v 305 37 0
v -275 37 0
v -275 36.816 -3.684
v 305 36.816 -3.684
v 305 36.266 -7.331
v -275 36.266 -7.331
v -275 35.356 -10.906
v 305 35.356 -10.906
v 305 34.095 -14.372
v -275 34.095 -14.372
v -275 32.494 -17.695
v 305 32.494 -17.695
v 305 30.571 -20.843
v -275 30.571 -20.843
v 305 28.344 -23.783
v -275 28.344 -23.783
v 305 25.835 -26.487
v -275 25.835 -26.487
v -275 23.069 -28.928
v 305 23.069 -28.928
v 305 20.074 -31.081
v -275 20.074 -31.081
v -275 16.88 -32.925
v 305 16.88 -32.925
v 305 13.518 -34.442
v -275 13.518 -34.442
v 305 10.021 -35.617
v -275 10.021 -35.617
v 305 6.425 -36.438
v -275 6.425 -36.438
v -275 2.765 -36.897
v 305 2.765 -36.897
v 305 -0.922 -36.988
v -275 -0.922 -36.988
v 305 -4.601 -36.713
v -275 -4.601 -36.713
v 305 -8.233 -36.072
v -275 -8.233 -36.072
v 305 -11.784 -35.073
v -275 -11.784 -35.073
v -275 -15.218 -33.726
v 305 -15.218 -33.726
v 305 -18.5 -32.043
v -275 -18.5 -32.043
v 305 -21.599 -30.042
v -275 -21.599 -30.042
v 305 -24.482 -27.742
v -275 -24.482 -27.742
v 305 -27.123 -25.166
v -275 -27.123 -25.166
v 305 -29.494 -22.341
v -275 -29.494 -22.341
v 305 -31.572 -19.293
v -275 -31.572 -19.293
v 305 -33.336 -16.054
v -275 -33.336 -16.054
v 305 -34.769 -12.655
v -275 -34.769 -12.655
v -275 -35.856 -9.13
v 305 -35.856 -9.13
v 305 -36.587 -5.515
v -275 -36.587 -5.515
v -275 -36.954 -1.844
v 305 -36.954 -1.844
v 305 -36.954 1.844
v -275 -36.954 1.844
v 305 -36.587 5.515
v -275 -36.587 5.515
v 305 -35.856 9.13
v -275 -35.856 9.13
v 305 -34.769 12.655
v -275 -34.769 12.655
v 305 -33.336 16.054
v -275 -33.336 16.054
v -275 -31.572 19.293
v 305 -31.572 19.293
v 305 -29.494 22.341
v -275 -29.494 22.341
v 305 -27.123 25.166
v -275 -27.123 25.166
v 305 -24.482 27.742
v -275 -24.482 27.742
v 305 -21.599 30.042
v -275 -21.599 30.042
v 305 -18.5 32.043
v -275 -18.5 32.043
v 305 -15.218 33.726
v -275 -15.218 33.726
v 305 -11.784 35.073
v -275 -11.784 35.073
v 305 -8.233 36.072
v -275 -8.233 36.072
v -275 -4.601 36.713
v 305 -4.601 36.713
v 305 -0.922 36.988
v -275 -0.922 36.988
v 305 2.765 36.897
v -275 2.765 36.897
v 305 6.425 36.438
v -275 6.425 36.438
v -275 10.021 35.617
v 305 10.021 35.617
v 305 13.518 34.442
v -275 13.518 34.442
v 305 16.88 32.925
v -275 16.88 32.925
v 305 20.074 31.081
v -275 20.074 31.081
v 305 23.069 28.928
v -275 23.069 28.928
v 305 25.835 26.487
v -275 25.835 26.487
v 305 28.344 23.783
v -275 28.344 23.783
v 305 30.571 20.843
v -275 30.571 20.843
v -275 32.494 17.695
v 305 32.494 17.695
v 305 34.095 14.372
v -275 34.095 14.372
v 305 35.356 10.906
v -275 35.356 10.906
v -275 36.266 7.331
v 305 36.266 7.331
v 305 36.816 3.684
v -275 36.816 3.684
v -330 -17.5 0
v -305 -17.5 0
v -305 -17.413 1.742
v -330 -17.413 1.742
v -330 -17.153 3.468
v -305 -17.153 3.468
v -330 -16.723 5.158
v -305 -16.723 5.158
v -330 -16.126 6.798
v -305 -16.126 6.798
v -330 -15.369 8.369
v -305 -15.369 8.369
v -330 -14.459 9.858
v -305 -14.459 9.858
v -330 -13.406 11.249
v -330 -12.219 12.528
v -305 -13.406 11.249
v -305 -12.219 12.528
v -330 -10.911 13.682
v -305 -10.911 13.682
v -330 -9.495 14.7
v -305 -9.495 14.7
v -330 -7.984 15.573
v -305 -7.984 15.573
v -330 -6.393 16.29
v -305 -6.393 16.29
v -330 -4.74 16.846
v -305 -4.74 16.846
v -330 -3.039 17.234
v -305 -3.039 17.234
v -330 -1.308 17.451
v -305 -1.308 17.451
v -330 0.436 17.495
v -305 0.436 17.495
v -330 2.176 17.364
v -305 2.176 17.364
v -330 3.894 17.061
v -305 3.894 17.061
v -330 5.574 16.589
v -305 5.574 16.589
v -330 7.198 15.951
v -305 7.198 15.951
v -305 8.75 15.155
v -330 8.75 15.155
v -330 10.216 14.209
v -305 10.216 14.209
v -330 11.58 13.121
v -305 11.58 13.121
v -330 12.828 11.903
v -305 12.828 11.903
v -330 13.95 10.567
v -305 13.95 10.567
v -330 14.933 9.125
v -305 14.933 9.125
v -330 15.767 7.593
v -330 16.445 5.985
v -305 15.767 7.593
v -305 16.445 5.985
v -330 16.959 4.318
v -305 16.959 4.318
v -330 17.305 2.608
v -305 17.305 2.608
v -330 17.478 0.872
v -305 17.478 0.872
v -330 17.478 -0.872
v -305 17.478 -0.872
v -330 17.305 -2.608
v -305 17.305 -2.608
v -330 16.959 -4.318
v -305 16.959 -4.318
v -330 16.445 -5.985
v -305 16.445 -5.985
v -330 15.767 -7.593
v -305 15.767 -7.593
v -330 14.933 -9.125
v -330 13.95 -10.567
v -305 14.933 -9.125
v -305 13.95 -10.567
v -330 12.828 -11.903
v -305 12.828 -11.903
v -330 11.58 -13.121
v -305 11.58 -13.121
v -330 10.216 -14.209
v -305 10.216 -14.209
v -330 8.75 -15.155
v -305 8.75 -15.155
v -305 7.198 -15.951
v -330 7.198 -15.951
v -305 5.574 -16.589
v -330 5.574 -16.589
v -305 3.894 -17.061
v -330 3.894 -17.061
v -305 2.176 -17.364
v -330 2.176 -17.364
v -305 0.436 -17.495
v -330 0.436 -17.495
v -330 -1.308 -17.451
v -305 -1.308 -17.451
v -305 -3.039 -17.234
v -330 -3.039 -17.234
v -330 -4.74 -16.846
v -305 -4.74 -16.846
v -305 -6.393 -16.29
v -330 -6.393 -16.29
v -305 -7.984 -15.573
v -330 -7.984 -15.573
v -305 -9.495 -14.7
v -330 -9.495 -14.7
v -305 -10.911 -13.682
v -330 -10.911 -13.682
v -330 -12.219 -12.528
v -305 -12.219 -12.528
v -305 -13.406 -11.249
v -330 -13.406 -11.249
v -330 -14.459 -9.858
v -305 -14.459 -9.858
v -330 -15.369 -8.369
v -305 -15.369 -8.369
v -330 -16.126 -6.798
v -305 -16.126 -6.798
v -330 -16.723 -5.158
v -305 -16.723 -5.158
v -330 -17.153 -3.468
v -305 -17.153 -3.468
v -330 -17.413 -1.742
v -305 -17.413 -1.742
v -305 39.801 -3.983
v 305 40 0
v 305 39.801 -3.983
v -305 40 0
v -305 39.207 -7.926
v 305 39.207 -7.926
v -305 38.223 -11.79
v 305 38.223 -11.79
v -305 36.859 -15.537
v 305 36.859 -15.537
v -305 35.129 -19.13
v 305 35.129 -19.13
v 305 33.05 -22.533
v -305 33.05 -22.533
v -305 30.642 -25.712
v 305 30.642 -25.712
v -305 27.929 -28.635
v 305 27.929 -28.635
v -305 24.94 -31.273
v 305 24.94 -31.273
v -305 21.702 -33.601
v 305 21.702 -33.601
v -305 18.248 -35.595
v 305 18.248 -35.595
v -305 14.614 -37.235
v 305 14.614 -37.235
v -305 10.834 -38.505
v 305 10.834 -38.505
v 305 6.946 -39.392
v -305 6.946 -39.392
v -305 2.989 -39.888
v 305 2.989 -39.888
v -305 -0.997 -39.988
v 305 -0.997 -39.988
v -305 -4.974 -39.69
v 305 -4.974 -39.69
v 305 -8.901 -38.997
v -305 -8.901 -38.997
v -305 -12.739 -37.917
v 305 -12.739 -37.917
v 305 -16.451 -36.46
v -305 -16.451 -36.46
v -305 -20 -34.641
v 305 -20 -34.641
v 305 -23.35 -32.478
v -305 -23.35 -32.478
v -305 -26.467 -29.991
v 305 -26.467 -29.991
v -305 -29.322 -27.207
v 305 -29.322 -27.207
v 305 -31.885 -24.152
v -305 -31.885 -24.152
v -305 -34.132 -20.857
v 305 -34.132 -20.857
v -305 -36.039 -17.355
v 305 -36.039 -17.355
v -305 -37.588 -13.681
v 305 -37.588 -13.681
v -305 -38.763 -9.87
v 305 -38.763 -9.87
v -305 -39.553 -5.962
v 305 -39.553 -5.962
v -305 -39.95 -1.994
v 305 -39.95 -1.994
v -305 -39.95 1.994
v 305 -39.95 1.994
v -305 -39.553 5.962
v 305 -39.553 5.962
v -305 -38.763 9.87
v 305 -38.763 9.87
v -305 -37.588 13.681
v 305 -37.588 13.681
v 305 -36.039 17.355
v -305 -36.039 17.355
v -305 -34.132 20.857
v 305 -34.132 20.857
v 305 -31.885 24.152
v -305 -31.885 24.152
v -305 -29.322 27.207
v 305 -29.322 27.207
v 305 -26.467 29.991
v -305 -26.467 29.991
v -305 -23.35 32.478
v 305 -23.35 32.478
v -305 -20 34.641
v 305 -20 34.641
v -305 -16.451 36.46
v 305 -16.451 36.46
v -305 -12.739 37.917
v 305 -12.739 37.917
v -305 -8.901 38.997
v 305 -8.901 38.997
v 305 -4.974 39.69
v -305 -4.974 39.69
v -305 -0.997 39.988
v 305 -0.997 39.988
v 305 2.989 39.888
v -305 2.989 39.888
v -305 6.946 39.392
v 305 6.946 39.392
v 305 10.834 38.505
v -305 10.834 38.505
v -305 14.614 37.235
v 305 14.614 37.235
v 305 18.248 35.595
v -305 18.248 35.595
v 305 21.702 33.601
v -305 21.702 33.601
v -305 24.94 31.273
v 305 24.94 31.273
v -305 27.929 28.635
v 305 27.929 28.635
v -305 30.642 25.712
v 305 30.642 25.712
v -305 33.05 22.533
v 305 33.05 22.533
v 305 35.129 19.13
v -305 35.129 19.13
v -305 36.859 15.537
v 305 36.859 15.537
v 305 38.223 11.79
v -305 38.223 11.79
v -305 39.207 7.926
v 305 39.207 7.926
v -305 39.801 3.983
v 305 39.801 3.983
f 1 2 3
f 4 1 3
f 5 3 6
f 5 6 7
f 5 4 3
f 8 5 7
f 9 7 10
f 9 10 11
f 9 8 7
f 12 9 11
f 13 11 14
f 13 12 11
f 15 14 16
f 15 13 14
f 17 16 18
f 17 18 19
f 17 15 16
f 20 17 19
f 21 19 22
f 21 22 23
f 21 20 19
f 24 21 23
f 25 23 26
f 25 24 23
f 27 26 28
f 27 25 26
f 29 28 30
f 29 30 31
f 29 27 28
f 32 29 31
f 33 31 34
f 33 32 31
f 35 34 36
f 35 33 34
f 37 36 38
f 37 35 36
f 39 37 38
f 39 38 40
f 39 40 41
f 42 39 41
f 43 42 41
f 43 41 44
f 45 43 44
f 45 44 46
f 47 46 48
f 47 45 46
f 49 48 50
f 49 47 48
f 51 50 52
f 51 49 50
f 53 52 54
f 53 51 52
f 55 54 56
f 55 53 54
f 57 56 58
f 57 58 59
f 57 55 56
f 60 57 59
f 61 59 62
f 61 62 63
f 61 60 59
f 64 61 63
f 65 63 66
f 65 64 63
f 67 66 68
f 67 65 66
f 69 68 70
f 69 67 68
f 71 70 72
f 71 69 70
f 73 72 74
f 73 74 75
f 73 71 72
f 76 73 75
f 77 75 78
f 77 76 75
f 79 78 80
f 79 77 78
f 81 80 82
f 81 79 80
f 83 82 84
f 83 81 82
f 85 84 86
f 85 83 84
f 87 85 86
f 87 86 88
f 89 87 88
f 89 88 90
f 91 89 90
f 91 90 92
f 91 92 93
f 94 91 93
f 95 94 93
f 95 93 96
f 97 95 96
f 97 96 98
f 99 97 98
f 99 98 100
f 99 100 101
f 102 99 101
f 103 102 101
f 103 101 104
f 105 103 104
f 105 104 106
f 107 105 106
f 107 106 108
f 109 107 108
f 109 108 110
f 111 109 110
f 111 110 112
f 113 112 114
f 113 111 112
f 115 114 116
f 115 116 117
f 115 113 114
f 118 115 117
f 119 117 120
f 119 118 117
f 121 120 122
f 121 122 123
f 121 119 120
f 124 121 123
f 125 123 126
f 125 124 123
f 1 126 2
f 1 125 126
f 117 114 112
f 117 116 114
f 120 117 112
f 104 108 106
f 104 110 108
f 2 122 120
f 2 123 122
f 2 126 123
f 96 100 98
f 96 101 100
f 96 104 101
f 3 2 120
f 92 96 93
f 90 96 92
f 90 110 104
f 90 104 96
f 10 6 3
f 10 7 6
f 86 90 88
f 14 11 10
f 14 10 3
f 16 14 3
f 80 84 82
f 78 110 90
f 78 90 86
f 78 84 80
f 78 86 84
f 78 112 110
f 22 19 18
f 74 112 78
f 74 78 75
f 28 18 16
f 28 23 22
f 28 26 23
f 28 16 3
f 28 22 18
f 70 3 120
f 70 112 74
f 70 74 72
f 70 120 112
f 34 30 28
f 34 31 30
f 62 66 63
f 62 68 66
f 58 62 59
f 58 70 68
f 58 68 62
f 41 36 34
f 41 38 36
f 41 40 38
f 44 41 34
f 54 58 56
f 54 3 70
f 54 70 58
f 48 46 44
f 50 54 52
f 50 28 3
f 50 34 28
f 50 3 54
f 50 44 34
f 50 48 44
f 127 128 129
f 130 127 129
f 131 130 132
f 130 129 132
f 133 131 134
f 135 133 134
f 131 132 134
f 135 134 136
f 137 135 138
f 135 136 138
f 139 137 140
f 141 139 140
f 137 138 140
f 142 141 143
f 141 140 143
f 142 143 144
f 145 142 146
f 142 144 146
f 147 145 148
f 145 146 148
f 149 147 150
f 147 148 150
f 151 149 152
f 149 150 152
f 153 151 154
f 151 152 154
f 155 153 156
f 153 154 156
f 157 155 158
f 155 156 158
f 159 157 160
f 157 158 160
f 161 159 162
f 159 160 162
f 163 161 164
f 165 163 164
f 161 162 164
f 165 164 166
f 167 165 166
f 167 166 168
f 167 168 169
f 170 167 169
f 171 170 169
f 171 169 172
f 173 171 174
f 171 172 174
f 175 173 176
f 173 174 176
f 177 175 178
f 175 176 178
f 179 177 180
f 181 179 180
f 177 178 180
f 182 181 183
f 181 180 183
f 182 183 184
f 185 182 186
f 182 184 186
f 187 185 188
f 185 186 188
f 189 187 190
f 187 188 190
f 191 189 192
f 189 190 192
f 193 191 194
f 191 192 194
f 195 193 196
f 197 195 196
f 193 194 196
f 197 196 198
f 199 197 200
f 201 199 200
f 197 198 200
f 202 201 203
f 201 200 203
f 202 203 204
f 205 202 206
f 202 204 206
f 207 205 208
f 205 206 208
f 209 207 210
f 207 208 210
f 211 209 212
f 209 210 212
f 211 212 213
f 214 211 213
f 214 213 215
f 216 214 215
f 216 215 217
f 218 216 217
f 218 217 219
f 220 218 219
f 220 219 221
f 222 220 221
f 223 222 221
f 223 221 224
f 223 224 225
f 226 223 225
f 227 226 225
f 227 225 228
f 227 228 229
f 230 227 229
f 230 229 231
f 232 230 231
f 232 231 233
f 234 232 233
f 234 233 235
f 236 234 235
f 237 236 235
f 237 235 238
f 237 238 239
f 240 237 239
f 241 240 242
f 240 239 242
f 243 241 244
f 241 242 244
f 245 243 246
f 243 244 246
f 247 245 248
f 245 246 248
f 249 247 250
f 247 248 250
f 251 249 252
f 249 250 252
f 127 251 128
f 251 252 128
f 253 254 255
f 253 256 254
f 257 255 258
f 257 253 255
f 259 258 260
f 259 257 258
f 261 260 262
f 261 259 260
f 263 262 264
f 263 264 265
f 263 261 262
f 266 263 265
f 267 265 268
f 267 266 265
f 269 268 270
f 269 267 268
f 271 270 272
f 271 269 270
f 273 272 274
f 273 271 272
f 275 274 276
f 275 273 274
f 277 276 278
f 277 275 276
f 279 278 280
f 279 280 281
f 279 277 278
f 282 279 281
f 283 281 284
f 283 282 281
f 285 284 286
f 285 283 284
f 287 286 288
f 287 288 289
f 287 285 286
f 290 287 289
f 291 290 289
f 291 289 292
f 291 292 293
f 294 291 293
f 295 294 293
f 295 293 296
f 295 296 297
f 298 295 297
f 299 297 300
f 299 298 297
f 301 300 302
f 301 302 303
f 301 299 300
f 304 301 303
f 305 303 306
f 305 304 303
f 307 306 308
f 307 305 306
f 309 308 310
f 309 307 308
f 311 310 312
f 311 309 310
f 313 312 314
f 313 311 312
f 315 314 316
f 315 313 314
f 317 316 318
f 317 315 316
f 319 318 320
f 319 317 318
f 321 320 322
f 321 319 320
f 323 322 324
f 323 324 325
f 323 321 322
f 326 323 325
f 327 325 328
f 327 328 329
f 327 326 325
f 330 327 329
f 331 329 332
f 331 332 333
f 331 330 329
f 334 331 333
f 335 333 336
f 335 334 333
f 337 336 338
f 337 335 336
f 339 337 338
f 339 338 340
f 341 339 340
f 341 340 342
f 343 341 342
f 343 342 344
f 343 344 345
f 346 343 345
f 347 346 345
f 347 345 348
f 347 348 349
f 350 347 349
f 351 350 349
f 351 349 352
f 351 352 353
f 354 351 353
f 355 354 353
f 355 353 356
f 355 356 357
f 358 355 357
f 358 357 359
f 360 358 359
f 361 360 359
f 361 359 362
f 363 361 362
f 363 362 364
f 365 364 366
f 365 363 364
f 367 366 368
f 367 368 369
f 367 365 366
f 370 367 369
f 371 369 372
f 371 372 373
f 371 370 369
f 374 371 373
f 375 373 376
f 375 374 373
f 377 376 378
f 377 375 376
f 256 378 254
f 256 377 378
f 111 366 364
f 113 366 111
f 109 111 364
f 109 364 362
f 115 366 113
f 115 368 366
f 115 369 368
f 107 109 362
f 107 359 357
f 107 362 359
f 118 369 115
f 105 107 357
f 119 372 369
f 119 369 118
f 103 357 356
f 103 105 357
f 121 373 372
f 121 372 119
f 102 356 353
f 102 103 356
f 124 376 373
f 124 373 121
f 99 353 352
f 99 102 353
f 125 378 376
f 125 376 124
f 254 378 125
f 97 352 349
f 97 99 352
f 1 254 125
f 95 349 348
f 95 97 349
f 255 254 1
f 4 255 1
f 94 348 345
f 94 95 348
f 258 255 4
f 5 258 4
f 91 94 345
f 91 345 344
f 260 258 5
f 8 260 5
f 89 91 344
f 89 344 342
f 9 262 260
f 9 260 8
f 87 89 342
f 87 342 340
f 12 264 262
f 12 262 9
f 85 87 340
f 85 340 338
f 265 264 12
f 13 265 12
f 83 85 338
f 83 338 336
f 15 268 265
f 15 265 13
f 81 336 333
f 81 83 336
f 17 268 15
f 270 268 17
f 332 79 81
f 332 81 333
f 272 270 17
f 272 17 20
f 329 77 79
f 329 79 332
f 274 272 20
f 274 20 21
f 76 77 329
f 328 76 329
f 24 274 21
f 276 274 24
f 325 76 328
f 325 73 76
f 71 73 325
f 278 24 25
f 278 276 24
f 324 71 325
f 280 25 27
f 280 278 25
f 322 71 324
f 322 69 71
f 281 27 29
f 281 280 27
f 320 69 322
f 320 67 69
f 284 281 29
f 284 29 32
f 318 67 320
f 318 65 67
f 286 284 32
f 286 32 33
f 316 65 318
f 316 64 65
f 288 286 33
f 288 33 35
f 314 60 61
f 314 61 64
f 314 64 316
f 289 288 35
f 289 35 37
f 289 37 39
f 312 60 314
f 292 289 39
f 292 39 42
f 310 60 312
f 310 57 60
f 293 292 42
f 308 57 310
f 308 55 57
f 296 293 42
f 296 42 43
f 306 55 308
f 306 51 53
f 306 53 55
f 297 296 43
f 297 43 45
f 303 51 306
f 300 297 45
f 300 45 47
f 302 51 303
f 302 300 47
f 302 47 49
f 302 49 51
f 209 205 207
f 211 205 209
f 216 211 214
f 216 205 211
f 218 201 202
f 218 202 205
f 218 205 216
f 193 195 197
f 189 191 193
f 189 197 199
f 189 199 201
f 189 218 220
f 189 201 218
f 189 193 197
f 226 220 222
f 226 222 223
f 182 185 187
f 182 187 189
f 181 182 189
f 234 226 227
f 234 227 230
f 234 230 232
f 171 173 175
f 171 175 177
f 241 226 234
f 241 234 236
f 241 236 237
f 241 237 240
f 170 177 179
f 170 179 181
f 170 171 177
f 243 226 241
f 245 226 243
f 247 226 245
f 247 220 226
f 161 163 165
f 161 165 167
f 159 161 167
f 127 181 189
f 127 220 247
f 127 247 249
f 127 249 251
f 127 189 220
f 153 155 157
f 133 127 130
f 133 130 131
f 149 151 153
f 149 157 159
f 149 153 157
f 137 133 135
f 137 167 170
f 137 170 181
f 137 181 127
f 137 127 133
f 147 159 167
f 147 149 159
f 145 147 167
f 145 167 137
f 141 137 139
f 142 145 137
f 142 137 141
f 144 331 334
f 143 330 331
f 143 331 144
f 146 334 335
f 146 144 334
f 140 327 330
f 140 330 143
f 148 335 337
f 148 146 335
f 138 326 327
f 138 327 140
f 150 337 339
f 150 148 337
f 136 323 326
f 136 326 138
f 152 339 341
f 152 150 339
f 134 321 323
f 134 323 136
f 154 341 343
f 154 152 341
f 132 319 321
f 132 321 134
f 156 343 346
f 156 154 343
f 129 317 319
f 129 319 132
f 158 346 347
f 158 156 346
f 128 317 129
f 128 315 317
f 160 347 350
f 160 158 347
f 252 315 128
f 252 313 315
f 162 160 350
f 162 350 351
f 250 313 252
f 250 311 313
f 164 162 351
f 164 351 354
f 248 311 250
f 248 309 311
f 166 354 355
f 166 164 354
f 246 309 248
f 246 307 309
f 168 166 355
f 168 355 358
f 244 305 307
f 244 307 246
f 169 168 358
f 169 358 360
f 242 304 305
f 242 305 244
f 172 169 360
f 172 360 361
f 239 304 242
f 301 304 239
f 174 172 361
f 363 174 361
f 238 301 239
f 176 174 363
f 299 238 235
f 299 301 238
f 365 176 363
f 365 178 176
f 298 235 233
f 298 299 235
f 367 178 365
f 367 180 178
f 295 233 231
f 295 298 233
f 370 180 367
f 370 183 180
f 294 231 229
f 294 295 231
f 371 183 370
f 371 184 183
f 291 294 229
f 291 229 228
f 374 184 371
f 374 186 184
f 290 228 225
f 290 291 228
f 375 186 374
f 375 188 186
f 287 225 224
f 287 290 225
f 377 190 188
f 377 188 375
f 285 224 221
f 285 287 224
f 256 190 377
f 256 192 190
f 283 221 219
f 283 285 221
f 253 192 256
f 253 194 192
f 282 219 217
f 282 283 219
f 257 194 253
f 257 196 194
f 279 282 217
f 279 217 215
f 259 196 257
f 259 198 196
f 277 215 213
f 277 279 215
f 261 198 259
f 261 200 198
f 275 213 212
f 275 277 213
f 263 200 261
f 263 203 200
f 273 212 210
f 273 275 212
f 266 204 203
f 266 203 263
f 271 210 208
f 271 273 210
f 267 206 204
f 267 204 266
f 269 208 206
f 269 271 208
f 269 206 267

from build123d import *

# Parameters (mm, degrees)
F0_W     = 30
F0_H     = 37
F2_R     = 17.5
F3_DEPTH = 25


with BuildPart() as f1:
    # F0 (on Top) → F1 (revolve)
    with BuildSketch(Plane.XY):
        Polygon((305, 40), (-305, 40), (-305, 37), (-275, 37), (305, 37), align=None)
        with Locations((-290, 18.5)):
            Rectangle(F0_W, F0_H)
    revolve(axis=Axis((-46.437122, 0, 0), (-1, 0, 0)))

    # F2 (on face) → F3 (join)
    with BuildSketch(Plane(origin=(-305, 0, 0), x_dir=(0, -1, 0), z_dir=(-1, 0, 0))):
        Circle(F2_R)
    extrude(amount=F3_DEPTH)


solid = f1.part
